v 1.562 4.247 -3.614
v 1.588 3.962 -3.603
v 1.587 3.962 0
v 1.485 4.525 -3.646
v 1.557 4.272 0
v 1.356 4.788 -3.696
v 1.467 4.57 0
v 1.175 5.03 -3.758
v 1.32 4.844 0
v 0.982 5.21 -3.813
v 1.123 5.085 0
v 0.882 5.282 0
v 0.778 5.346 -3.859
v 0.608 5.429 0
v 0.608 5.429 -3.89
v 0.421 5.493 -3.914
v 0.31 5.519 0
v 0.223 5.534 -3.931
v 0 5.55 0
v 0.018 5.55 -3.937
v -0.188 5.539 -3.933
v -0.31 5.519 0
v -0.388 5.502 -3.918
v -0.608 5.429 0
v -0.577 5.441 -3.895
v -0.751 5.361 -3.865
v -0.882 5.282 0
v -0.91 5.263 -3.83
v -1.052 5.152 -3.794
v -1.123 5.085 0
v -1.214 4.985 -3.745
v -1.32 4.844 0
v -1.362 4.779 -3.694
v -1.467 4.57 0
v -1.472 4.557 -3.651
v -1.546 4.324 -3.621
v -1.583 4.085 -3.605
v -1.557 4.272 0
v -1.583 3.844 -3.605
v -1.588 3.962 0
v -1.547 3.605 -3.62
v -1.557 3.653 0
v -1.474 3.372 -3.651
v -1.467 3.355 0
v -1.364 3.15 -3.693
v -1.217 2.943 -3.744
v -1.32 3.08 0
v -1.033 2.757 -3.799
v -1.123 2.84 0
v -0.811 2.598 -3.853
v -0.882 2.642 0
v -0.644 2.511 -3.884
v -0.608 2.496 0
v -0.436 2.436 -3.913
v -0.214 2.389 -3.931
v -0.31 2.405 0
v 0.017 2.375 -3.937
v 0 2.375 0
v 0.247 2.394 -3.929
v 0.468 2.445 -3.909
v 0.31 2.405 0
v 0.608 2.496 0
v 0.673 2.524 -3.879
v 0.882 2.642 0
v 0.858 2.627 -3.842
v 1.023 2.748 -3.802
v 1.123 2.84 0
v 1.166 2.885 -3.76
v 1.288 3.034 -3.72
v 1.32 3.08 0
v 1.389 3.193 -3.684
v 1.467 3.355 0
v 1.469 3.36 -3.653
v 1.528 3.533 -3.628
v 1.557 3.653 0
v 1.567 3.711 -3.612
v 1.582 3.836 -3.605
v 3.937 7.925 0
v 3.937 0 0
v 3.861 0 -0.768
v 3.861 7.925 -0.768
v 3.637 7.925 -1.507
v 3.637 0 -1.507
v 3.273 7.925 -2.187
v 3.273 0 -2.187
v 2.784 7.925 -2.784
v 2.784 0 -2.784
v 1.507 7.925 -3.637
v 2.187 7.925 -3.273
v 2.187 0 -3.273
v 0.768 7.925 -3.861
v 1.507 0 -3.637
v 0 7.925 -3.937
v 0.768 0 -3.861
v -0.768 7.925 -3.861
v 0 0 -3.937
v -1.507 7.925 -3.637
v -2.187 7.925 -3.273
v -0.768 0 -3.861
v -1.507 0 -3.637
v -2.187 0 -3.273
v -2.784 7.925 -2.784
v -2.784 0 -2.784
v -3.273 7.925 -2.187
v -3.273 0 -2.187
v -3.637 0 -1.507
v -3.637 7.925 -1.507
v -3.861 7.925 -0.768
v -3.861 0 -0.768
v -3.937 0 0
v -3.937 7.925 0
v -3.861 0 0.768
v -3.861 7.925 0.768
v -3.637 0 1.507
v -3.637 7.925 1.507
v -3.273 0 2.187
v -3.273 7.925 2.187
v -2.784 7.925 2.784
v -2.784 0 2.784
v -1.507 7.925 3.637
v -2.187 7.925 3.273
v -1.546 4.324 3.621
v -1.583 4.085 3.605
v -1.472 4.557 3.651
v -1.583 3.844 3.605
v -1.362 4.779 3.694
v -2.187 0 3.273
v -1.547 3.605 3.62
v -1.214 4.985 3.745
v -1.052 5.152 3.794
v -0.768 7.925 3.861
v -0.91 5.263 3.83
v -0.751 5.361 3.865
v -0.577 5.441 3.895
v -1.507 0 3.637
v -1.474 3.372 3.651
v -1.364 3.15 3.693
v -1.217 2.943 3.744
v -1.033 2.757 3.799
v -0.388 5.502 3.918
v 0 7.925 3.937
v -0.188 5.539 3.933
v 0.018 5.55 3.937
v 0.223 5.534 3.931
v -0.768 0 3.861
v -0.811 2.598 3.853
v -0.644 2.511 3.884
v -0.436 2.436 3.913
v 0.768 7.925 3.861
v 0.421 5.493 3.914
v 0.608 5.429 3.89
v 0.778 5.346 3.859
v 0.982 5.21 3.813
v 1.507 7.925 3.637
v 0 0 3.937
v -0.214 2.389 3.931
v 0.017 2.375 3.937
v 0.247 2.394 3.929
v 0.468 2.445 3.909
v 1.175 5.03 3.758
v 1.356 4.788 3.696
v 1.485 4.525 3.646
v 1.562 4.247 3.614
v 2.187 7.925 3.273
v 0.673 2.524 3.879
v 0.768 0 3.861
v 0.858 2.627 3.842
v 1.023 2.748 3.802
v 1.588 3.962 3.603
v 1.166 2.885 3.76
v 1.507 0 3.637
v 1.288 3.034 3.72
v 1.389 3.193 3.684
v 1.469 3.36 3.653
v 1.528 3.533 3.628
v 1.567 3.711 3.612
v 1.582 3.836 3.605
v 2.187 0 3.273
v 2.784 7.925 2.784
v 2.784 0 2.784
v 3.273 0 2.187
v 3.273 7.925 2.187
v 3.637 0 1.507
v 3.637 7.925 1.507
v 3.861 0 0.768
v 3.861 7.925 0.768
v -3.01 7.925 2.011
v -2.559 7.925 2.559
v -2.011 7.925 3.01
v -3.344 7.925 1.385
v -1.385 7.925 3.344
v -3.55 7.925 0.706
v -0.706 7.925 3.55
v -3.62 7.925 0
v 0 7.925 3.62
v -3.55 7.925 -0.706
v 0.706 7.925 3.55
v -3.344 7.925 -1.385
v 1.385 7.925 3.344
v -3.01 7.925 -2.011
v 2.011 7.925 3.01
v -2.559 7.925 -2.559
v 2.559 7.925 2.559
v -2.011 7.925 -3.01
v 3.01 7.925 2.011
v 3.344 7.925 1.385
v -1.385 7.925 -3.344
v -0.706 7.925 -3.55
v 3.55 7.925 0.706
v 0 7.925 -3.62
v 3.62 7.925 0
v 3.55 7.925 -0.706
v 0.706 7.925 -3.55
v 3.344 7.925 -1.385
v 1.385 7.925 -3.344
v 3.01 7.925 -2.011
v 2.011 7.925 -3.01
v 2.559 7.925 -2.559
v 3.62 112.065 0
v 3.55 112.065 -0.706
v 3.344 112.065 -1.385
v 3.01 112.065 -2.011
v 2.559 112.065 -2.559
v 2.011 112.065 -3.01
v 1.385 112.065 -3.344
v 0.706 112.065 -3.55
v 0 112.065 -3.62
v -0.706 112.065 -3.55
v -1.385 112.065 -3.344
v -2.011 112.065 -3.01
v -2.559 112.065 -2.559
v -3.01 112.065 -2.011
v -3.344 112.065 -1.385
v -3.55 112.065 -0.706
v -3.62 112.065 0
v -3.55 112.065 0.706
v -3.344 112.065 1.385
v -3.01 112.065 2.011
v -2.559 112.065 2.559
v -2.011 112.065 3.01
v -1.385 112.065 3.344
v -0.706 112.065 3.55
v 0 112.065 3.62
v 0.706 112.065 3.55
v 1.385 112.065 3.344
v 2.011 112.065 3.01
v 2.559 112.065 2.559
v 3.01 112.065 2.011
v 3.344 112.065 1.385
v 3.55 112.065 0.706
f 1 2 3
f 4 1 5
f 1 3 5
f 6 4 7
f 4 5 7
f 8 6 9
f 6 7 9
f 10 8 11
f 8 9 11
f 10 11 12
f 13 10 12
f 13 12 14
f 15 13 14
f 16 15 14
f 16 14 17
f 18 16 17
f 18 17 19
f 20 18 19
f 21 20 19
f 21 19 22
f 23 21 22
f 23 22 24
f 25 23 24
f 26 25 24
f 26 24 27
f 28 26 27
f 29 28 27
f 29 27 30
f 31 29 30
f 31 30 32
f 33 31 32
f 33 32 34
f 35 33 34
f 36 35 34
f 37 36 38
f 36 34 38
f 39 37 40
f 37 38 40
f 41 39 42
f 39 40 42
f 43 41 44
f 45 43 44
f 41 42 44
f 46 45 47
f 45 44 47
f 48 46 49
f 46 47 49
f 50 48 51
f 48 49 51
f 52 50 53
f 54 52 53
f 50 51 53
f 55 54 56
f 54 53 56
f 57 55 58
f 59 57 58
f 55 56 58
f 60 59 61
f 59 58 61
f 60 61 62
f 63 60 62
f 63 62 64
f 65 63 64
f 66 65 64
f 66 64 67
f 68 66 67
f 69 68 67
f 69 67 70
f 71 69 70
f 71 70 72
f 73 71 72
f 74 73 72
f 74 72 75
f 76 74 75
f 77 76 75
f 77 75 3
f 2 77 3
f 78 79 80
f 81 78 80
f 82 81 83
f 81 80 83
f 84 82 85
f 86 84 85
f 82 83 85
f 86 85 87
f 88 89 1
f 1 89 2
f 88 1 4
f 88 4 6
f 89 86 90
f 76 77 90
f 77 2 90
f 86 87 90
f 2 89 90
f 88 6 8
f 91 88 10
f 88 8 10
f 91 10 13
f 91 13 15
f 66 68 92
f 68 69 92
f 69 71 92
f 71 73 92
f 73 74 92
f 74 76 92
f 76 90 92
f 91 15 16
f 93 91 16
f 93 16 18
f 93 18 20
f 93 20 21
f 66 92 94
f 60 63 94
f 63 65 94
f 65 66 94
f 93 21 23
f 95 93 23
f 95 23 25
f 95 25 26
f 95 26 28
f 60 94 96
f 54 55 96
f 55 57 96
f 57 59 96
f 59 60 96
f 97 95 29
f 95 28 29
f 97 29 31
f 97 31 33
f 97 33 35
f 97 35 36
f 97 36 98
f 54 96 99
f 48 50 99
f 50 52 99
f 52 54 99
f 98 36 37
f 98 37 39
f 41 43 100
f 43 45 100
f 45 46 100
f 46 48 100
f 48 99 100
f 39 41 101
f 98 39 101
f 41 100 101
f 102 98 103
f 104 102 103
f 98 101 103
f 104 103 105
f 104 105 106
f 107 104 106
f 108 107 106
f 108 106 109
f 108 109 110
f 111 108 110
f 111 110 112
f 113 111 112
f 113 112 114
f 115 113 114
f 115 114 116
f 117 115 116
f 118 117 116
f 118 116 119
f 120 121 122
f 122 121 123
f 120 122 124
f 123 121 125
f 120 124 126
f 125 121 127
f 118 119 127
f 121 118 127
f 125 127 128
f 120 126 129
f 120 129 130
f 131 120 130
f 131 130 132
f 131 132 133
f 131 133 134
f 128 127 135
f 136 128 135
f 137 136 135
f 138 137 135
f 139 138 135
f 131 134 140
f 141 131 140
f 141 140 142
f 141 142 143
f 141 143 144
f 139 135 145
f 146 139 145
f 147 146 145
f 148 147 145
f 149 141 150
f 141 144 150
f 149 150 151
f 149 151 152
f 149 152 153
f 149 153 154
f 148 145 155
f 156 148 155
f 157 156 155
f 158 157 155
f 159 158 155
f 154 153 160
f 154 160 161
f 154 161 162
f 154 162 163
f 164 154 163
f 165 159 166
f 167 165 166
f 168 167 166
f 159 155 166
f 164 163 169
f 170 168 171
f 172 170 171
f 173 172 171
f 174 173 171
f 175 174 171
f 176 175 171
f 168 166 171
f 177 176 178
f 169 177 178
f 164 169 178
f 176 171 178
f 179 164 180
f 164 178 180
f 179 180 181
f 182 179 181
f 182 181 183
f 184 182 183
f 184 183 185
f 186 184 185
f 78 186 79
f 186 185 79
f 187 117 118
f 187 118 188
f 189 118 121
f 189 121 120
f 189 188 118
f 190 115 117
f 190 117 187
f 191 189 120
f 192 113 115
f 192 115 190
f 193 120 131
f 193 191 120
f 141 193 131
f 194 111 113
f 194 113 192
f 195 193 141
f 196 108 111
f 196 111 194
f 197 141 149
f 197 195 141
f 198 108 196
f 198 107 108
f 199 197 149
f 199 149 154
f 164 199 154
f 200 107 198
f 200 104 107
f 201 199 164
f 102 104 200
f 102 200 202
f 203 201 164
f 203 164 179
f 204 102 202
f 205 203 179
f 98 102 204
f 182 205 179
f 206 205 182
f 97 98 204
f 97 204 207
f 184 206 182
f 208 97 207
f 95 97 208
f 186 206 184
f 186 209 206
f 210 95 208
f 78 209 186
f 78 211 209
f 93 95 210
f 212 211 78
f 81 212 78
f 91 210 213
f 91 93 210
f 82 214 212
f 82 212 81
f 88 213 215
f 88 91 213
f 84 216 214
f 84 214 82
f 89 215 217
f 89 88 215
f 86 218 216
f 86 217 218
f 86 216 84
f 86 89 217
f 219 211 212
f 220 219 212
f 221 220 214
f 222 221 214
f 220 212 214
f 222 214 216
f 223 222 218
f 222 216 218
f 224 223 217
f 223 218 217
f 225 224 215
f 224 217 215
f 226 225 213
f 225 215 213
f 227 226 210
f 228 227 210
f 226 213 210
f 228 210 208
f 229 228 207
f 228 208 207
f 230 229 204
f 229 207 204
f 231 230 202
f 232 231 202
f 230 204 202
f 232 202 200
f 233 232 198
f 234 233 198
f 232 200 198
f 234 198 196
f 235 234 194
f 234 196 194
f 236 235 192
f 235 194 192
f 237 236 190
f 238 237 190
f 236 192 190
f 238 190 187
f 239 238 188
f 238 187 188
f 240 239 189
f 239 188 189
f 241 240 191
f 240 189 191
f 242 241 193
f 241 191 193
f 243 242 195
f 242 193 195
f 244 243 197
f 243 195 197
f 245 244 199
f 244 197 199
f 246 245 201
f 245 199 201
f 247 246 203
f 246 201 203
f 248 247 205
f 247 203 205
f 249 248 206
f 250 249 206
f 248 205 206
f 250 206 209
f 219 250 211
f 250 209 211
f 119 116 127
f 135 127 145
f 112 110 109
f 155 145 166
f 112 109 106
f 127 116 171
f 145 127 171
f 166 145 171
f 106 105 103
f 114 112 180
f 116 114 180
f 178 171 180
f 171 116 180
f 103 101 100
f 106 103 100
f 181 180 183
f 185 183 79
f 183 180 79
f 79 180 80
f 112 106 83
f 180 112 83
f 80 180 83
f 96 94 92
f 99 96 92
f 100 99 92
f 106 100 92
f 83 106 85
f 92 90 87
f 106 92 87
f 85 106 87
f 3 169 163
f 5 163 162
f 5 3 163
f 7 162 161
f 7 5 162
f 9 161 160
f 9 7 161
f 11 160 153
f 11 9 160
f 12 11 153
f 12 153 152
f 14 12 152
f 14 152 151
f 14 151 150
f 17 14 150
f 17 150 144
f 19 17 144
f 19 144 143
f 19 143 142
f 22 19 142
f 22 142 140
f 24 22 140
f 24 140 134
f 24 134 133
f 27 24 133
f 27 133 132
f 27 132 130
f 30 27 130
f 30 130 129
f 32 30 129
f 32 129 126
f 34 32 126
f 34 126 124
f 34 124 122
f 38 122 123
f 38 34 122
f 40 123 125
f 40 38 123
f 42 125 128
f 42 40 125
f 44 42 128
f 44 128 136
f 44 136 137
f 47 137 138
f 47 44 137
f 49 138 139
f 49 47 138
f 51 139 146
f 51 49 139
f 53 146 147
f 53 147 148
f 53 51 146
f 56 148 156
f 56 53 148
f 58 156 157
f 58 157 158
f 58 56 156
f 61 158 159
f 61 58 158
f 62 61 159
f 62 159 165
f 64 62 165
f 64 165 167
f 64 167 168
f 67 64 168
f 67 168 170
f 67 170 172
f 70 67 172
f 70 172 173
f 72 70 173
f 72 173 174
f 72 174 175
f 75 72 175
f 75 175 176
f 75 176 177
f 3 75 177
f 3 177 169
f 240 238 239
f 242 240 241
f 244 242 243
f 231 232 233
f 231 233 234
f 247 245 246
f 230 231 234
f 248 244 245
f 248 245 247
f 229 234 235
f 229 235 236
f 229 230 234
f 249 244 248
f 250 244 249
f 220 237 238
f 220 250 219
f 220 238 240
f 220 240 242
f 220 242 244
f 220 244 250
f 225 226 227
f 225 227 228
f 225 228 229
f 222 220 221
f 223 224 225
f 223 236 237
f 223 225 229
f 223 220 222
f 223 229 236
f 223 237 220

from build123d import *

# Parameters (mm, degrees)
SKETCH1_R               = 3.937
BOSS_EXTRUDE1_DEPTH     = 7.9248
SKETCH3_R               = 3.6195
BOSS_EXTRUDE2_DEPTH     = 104.14
SKETCH4_R               = 1.5875
CUT_EXTRUDE1_DEPTH      = 4.937
CUT_EXTRUDE1_DEPTH_BACK = 4.937


with BuildPart() as part:
    # Sketch1 → Boss-Extrude1 (new body)
    with BuildSketch(Plane(origin=(0, 0, 0), x_dir=(1, 0, 0), z_dir=(0, 1, 0))):
        Circle(SKETCH1_R)
    extrude(amount=BOSS_EXTRUDE1_DEPTH)

    # Sketch3 → Boss-Extrude2 (add)
    with BuildSketch(Plane(origin=(0, 7.9248, 0), x_dir=(1, 0, 0), z_dir=(0, 1, 0))):
        Circle(SKETCH3_R)
    extrude(amount=BOSS_EXTRUDE2_DEPTH)

    # Sketch4 → Cut-Extrude1 (cut, two sides)
    with BuildSketch(Plane.XY) as cut_extrude1_sk:
        with Locations((0, 3.9624)):
            Circle(SKETCH4_R)
    extrude(amount=CUT_EXTRUDE1_DEPTH, mode=Mode.SUBTRACT)
    extrude(cut_extrude1_sk.sketch, amount=-CUT_EXTRUDE1_DEPTH_BACK, mode=Mode.SUBTRACT)


solid = part.part
